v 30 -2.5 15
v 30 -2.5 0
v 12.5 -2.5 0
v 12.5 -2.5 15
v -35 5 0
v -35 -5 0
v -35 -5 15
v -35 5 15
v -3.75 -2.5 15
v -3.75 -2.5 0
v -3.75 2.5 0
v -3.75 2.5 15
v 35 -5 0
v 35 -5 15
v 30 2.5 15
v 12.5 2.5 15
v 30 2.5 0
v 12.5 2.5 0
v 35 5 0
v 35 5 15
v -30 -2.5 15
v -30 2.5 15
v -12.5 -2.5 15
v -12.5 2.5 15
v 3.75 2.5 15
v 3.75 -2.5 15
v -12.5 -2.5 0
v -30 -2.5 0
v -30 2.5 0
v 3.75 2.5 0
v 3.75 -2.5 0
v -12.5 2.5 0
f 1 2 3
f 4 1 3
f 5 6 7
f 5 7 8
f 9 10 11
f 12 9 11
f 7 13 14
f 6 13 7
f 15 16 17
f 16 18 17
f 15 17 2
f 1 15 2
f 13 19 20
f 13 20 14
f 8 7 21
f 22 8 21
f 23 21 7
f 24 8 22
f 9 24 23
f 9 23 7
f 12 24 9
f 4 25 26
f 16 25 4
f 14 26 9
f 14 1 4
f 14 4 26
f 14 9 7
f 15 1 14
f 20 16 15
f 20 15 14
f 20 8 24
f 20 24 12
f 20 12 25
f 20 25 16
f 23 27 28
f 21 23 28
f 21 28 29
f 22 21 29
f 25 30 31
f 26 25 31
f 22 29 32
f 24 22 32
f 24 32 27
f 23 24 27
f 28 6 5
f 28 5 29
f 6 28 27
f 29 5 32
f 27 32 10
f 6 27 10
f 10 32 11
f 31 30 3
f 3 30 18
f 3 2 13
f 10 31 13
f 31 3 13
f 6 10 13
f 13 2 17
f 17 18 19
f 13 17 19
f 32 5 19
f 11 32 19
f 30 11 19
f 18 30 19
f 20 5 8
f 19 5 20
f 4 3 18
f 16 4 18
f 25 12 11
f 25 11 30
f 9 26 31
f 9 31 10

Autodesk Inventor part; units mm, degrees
ref_plane "YZ Plane" through (0, 0, 0) normal (1, 0, 0) x (0, 1, 0)
ref_plane "XZ Plane" through (0, 0, 0) normal (0, 1, 0) x (-1, 0, 0)
ref_plane "XY Plane" through (0, 0, 0) normal (0, 0, 1) x (1, 0, 0)
sketch "Sketch1" plane through (0, 0, 0) normal (0, 0, 1) x (1, 0, 0)
  line L0 (-35, 5) -> (35, 5)
  line L1 (35, 5) -> (35, -5)
  line L2 (35, -5) -> (-35, -5)
  line L3 (-35, -5) -> (-35, 5)
  line L4 (-30, 2.5) -> (-12.5, 2.5)
  line L5 (-12.5, 2.5) -> (-12.5, -2.5)
  line L6 (-12.5, -2.5) -> (-30, -2.5)
  line L7 (-30, -2.5) -> (-30, 2.5)
  line L8 (12.5, 2.5) -> (30, 2.5)
  line L9 (30, 2.5) -> (30, -2.5)
  line L10 (30, -2.5) -> (12.5, -2.5)
  line L11 (12.5, -2.5) -> (12.5, 2.5)
  line L12 (-3.75, 2.5) -> (3.75, 2.5)
  line L13 (3.75, 2.5) -> (3.75, -2.5)
  line L14 (3.75, -2.5) -> (-3.75, -2.5)
  line L15 (-3.75, -2.5) -> (-3.75, 2.5)
  point P0 (0, 0)
  dimension "d0" = 70
  dimension "d1" = 5
  dimension "d2" = 10
  dimension "d3" = 35
  dimension "d5" = 5
  dimension "d6" = 5
  dimension "d7" = 5
  dimension "d8" = 17.5
  dimension "d9" = 17.5
  dimension "d10" = 2.5
  dimension "d13" = 7.5
  dimension "d14" = 5
  dimension "d15" = 3.75
  dimension "d16" = 2.5
extrude "Extrusion1" add sketch "Sketch1" along normal blind 15
properties part number "Fixture"
